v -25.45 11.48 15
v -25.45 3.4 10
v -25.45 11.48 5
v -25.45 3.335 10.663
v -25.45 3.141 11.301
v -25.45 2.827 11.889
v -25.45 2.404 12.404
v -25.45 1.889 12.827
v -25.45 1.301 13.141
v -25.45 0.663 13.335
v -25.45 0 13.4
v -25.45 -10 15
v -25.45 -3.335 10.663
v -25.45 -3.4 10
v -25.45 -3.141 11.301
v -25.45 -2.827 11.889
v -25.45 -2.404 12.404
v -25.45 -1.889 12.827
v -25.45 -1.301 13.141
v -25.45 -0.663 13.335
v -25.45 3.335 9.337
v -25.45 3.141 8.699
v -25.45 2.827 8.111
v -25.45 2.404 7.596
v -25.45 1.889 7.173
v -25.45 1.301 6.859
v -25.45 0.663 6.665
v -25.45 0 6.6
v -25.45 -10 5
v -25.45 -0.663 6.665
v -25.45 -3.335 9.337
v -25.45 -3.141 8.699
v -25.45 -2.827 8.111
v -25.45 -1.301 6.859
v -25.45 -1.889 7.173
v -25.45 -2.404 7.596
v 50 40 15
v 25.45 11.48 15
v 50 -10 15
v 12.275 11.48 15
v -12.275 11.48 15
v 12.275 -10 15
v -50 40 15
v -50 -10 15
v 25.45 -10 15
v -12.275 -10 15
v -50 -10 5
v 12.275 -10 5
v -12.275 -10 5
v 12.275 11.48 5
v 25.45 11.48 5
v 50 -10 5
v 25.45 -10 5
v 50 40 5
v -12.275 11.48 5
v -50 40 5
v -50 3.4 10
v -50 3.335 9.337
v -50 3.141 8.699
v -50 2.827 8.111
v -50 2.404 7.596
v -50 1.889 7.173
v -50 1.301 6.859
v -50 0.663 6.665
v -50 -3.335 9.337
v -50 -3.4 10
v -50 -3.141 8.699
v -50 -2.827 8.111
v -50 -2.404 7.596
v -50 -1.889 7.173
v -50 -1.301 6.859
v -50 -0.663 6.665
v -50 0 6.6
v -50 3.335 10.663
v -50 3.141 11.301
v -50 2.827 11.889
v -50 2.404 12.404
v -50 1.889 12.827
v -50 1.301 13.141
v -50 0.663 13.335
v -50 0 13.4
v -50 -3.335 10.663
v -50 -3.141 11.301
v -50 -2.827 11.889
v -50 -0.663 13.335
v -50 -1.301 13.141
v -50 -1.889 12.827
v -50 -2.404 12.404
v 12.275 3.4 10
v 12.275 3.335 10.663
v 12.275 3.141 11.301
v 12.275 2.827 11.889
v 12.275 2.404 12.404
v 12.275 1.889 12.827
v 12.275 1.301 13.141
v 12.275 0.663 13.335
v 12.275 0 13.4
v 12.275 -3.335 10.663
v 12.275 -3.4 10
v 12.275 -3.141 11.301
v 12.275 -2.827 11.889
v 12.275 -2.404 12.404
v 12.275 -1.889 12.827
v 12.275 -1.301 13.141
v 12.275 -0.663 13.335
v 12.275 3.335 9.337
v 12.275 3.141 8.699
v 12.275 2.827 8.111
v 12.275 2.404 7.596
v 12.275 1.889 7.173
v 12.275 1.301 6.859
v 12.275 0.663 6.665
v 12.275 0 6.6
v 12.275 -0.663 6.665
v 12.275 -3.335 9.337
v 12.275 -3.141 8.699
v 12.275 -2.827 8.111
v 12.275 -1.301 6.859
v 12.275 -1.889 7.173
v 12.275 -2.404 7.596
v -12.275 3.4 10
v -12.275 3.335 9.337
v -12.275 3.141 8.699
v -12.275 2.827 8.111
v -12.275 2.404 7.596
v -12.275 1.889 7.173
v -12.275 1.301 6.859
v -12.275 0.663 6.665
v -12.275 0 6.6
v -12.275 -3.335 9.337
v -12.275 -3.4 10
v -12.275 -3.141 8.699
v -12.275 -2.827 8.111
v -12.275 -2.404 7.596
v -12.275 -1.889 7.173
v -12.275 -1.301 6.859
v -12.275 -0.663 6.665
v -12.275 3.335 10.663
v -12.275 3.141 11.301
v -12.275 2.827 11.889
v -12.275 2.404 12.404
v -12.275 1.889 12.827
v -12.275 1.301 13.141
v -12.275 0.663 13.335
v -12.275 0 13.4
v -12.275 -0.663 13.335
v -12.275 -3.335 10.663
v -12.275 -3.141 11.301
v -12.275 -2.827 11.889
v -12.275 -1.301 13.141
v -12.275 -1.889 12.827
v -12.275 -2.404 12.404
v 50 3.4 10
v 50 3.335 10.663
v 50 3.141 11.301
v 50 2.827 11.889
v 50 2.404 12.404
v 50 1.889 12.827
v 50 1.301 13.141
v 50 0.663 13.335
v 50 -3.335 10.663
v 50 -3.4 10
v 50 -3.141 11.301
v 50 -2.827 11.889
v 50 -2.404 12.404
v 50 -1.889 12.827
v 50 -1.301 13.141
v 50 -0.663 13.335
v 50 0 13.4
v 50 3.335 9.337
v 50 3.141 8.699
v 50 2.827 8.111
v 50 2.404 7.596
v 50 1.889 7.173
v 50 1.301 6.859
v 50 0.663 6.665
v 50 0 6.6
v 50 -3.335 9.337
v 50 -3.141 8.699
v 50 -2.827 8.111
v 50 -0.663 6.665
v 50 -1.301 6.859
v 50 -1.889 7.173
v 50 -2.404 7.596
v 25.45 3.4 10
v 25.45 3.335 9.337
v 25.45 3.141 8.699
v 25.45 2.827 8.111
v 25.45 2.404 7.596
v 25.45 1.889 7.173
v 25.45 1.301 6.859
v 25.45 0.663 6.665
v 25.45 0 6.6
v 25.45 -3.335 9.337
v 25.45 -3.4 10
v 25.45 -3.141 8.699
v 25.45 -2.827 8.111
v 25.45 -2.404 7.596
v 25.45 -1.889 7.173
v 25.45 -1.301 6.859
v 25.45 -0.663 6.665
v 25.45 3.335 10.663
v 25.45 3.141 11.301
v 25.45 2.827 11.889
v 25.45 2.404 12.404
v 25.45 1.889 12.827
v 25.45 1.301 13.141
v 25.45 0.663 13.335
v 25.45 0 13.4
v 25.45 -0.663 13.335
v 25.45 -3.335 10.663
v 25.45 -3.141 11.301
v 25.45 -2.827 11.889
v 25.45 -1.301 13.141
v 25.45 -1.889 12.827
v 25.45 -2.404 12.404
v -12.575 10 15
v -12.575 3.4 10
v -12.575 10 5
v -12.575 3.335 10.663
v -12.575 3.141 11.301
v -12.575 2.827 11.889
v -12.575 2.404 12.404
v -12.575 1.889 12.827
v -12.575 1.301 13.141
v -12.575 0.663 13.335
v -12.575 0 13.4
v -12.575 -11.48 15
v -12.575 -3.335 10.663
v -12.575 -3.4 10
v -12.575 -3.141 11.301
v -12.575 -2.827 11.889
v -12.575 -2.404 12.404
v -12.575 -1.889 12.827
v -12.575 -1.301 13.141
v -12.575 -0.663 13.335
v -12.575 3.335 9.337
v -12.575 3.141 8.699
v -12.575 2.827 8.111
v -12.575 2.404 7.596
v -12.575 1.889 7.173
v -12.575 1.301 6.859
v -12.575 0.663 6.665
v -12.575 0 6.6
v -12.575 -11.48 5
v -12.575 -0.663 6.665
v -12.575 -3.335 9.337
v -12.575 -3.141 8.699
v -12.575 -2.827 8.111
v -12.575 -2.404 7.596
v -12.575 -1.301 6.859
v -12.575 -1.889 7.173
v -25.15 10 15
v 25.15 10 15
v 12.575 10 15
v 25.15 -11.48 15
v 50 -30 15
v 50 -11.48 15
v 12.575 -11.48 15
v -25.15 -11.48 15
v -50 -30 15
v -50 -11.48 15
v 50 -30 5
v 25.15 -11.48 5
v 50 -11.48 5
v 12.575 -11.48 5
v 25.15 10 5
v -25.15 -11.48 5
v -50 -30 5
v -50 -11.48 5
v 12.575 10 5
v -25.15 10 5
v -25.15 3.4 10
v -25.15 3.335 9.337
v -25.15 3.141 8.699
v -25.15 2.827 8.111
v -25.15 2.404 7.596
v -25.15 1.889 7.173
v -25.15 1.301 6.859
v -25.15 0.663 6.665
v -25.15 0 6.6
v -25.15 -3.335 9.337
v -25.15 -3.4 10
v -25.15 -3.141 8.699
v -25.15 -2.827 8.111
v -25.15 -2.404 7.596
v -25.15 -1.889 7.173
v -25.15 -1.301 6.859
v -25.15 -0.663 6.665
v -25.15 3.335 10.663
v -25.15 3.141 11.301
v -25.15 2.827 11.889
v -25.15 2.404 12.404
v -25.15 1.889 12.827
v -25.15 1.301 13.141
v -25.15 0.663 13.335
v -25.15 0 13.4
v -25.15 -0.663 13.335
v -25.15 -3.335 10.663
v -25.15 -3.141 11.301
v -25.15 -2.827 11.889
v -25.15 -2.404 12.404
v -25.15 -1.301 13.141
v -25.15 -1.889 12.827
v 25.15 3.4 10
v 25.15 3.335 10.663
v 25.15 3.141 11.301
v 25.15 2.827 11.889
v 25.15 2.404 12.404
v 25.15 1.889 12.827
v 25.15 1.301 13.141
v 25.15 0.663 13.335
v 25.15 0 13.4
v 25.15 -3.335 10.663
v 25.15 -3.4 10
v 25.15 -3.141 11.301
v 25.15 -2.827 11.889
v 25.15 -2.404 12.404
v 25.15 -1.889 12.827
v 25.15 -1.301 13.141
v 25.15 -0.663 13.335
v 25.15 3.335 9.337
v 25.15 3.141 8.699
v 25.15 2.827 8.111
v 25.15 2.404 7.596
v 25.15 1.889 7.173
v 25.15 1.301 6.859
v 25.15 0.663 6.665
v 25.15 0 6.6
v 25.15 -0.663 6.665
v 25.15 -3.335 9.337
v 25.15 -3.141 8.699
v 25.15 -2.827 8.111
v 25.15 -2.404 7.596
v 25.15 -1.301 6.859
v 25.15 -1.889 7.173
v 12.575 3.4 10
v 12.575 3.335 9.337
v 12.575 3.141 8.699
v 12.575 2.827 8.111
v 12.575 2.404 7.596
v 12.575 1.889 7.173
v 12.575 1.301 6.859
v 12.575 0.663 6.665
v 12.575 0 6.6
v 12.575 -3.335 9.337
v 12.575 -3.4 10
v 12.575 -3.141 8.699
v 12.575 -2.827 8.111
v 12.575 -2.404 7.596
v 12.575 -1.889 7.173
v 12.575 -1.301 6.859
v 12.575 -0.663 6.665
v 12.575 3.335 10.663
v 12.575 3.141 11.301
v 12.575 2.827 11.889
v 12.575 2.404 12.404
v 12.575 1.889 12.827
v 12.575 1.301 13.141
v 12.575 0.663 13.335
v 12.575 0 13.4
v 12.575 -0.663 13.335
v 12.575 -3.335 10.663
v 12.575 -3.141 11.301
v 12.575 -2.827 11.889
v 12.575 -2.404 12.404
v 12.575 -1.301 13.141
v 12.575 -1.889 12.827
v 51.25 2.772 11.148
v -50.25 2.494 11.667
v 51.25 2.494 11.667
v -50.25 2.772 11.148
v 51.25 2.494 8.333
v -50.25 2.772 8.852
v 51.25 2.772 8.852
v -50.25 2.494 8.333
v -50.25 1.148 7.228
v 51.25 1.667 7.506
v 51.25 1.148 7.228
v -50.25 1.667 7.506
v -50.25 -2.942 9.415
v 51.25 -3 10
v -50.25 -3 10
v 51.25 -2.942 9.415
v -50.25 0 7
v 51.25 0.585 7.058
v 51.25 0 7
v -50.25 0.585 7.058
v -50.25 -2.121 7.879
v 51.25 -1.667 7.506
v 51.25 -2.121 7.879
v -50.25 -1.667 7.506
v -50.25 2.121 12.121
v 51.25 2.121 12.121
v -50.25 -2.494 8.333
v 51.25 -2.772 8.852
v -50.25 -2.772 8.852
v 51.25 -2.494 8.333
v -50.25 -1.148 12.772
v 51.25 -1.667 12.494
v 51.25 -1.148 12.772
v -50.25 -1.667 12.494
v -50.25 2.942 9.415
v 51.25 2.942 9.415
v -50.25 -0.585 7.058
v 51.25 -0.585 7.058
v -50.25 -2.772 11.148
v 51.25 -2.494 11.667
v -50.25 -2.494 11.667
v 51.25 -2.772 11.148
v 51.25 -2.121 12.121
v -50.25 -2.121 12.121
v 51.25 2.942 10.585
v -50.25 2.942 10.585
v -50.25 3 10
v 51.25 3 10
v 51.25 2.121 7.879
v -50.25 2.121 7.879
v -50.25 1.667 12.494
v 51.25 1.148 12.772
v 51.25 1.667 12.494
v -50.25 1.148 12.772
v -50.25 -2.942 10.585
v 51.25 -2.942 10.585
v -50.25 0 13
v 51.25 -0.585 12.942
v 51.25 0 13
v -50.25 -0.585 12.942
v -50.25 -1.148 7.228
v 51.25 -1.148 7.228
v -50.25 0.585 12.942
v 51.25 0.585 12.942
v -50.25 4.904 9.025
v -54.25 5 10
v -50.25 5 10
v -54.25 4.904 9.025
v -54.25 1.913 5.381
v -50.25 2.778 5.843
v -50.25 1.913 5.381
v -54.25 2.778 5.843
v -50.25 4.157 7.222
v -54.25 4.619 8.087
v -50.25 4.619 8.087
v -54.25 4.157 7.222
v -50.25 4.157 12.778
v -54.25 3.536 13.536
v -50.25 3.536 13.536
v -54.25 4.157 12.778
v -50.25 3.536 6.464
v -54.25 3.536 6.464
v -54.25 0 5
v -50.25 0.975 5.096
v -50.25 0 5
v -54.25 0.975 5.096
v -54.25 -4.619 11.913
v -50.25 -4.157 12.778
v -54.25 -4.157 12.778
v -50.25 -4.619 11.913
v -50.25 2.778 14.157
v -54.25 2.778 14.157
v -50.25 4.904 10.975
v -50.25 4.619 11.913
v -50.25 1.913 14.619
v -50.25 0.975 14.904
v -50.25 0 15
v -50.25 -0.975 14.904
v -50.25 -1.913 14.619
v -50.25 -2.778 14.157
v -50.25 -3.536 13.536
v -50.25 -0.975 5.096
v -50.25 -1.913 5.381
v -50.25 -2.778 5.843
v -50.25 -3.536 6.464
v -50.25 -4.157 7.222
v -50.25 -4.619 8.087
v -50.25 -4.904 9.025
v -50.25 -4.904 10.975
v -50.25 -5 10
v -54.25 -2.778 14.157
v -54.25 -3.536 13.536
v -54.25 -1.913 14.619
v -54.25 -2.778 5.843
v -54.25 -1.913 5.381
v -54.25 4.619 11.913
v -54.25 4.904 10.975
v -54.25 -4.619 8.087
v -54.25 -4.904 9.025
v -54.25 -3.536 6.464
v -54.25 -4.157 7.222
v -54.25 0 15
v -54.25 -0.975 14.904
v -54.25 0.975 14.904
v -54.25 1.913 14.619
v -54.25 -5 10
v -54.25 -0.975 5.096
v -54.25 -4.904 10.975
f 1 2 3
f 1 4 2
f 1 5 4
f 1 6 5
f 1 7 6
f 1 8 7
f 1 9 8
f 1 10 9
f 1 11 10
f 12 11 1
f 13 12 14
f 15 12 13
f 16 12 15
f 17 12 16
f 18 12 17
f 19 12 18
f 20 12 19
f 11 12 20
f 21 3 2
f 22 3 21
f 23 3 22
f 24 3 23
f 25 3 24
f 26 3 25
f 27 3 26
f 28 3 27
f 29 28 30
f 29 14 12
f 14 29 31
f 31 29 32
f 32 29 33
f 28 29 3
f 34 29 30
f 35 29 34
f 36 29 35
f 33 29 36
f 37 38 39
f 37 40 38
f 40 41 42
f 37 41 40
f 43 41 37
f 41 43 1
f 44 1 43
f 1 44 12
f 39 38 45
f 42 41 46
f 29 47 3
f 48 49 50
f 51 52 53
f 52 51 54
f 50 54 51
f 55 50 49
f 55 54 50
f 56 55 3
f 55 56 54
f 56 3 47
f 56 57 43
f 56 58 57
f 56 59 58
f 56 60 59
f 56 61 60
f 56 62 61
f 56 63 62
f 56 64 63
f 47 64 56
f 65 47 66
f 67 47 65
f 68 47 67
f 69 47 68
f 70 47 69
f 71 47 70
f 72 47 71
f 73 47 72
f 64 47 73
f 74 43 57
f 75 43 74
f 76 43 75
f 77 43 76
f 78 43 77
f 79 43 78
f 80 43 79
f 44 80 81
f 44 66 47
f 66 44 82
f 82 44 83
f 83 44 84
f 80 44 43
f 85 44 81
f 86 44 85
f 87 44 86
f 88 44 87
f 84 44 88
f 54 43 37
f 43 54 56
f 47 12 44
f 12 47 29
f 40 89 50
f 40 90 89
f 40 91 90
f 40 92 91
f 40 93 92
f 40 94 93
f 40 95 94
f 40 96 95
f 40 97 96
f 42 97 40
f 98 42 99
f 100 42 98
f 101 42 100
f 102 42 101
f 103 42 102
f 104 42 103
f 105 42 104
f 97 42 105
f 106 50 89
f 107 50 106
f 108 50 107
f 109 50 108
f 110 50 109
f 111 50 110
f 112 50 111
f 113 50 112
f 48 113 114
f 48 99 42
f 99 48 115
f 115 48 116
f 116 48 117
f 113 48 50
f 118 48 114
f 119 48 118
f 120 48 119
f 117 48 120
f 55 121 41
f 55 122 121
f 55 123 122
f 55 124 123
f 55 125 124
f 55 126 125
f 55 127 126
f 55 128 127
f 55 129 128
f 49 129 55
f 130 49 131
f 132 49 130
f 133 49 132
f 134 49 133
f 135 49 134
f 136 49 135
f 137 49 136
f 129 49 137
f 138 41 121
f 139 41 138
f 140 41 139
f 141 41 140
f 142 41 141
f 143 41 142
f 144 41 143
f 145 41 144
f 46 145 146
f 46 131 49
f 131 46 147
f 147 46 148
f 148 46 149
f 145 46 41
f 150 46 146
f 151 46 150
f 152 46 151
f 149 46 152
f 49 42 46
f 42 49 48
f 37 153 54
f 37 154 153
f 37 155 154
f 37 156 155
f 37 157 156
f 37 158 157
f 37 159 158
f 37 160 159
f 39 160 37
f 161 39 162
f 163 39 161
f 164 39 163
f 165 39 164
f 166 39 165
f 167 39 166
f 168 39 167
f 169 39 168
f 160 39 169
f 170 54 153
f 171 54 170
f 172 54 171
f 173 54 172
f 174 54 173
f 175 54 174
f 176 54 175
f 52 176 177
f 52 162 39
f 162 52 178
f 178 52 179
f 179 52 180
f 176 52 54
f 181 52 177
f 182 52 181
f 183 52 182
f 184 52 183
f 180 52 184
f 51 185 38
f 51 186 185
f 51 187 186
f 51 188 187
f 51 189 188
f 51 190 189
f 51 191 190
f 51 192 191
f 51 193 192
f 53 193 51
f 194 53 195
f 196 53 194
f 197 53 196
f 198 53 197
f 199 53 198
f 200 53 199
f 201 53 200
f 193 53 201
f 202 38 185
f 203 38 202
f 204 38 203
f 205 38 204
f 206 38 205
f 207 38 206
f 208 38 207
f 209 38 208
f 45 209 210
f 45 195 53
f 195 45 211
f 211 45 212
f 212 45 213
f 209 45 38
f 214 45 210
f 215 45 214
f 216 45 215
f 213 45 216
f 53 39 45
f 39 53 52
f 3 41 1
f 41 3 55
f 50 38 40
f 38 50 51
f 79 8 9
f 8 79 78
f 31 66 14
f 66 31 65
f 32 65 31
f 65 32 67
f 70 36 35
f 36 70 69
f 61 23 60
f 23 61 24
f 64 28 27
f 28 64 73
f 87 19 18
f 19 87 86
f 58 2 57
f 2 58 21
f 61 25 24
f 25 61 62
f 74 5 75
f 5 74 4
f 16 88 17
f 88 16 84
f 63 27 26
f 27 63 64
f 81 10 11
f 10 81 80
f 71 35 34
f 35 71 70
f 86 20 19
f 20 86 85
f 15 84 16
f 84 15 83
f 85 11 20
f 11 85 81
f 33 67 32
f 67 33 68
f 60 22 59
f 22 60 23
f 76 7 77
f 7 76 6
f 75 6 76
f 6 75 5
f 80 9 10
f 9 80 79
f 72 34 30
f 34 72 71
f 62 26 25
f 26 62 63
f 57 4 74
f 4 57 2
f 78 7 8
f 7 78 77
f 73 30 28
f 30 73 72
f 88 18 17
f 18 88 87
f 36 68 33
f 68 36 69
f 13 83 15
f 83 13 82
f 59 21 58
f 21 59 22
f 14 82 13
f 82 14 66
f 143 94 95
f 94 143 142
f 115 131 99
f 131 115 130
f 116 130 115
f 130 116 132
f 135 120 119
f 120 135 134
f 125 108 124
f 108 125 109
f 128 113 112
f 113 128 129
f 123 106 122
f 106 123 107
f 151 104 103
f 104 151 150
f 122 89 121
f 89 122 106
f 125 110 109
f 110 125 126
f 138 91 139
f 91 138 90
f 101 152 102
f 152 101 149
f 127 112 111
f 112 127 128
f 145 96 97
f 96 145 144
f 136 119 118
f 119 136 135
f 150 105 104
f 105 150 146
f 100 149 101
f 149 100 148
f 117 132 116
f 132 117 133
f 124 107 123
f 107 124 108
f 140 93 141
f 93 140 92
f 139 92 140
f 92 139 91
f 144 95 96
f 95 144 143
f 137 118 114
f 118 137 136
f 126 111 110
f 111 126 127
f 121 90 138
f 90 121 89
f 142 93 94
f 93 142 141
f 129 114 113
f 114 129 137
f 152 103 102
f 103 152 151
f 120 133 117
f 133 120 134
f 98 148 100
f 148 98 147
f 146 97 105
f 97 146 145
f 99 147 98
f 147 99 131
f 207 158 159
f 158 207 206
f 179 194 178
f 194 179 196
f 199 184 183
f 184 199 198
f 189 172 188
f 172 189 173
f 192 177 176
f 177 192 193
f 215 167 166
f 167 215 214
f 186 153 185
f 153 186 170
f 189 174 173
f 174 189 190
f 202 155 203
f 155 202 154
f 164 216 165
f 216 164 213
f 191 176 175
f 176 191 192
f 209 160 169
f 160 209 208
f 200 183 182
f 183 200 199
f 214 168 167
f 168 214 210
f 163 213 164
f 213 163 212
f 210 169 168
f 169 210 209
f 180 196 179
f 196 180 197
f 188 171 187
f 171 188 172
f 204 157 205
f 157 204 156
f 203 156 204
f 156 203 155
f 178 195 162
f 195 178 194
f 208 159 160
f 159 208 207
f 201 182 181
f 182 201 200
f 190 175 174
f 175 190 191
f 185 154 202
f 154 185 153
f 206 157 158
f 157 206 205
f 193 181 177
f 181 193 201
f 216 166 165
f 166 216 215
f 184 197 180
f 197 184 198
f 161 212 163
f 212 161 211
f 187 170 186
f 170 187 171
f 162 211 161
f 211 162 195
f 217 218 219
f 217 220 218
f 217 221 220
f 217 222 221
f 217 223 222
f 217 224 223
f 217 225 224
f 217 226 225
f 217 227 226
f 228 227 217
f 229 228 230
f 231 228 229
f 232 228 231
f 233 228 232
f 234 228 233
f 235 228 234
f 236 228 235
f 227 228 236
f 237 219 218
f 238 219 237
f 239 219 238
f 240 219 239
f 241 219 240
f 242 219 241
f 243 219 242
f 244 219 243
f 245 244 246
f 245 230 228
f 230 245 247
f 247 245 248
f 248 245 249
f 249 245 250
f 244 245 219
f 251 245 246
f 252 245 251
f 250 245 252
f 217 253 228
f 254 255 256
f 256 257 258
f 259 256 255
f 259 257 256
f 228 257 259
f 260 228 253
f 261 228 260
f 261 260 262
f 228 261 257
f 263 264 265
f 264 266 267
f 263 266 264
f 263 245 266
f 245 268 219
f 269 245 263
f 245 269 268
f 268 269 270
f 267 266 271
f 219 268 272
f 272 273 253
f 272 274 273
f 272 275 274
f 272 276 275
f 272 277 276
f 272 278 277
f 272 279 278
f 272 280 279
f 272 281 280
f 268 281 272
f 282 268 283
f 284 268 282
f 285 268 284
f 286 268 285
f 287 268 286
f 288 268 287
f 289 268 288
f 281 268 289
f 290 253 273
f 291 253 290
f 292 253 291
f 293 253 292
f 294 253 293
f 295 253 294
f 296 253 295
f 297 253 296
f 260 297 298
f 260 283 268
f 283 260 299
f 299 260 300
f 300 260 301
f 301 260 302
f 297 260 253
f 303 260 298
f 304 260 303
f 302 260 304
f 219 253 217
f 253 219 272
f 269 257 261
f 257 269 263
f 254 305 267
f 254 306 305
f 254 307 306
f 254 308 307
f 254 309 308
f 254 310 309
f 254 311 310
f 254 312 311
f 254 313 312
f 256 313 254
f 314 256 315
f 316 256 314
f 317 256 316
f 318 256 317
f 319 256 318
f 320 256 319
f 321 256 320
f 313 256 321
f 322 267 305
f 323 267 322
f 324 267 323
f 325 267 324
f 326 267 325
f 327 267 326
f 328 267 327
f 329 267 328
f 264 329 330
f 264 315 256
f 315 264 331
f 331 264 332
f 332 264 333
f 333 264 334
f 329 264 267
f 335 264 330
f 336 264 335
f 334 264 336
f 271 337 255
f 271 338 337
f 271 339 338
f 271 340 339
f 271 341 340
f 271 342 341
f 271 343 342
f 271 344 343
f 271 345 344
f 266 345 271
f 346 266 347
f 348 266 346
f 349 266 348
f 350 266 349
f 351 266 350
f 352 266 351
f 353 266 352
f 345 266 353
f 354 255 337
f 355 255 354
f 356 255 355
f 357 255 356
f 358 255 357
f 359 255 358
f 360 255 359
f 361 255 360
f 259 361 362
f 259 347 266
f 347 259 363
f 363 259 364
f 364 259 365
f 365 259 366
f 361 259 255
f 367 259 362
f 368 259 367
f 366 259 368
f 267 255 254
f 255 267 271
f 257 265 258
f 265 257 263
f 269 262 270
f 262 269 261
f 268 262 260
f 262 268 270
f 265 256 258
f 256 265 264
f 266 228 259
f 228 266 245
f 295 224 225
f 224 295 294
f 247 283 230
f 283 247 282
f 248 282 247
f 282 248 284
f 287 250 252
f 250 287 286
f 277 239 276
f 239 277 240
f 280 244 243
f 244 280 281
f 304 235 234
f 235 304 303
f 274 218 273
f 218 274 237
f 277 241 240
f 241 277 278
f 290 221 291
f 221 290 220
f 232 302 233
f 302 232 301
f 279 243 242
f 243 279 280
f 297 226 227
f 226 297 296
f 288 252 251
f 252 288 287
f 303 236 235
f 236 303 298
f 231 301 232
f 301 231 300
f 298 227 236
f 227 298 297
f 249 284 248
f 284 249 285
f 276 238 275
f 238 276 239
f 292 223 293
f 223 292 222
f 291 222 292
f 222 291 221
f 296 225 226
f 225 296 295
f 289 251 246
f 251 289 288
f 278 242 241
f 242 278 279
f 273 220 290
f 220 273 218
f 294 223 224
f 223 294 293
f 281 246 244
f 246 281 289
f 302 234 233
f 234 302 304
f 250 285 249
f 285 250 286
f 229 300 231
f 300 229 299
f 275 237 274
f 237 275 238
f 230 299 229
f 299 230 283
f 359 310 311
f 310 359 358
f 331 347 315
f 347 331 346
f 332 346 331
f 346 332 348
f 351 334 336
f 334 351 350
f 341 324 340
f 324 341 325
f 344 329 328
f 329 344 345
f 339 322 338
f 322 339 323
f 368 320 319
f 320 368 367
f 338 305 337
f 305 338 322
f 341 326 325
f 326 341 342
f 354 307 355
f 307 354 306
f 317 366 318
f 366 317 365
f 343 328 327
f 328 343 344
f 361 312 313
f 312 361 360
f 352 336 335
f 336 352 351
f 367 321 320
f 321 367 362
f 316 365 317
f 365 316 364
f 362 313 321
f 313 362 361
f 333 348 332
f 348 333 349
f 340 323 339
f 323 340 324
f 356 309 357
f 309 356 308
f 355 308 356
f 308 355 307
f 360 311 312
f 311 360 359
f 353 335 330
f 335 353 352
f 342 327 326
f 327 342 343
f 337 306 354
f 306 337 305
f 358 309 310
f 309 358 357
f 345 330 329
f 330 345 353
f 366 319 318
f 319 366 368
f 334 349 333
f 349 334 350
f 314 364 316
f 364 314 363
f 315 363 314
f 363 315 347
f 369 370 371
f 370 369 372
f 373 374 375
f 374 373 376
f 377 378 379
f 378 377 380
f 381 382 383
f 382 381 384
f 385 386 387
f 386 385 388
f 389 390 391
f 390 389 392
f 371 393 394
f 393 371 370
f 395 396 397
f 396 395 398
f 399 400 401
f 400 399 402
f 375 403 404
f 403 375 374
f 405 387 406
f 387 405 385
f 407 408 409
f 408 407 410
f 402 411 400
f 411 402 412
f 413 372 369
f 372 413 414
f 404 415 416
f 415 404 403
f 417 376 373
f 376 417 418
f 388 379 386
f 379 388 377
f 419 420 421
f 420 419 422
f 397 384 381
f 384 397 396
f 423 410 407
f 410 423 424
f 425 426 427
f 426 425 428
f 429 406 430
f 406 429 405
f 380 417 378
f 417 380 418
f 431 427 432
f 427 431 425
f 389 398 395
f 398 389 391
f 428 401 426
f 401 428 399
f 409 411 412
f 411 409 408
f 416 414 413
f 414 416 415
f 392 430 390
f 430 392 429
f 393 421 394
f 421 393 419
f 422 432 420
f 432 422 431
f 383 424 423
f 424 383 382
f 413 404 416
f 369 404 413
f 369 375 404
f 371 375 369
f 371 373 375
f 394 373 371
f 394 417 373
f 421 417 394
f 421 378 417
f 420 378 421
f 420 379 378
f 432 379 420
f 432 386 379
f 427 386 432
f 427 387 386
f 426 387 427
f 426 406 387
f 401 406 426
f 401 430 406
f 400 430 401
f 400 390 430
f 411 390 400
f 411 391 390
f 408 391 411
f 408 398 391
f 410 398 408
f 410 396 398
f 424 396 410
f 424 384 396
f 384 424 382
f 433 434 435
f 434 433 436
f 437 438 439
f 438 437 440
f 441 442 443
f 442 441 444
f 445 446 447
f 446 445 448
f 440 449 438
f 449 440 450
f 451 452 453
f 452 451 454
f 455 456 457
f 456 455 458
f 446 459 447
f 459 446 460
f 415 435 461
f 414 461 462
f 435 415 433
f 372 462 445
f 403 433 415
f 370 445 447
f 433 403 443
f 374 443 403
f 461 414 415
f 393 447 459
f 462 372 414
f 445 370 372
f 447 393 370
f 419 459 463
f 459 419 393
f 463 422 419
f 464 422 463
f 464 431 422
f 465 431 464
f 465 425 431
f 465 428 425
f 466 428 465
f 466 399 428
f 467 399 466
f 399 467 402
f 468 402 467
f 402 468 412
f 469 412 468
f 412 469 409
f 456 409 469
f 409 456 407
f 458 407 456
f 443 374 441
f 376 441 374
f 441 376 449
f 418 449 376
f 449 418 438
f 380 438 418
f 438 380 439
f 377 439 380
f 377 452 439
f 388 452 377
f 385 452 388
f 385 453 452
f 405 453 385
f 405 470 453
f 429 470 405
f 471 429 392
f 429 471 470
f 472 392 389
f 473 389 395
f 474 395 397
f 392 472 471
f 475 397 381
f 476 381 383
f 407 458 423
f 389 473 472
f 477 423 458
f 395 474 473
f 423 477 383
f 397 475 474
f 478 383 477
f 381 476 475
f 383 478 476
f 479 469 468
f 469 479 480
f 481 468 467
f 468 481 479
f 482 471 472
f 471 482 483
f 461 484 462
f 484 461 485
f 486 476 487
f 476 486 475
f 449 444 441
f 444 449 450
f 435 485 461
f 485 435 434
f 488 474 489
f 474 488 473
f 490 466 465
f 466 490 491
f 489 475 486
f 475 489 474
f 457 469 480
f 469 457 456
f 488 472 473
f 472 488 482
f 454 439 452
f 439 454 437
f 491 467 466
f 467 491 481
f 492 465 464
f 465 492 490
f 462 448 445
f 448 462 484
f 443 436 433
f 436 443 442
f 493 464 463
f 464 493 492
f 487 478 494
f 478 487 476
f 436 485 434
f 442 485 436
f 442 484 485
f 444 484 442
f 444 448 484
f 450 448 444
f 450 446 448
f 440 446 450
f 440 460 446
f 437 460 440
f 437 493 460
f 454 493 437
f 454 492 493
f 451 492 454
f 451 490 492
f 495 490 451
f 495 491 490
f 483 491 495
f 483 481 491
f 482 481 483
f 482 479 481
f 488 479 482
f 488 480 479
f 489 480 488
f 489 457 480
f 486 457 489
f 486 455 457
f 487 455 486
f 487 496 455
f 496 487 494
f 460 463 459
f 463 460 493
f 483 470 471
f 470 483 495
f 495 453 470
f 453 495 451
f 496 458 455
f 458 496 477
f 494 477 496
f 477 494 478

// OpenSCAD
$fn = 32;

// ------------------------------------------------------------------------
// Butt hinge: hinge 100 mm, leaf swung 0 deg
// Every part is its own module, assembly() places every instance.
// ------------------------------------------------------------------------

// --- part 1 ---
module hinge_base() {
  difference() {
    union() {
      translate([-50, -10, -5]) cube([24.55, 50, 10]);
      translate([-12.275, -10, -5]) cube([24.55, 50, 10]);
      translate([25.45, -10, -5]) cube([24.55, 50, 10]);
      translate([-50, 11.48, -5]) cube([100, 28.52, 10]);
    }
    translate([-37.725, 0, 0]) rotate([0, 90, 0]) cylinder(h = 26.55, d = 6.8, center = true);
    translate([0, 0, 0]) rotate([0, 90, 0]) cylinder(h = 26.55, d = 6.8, center = true);
    translate([37.725, 0, 0]) rotate([0, 90, 0]) cylinder(h = 26.55, d = 6.8, center = true);
  }
}

// --- part 2 ---
module hinge_mover() {
  difference() {
    union() {
      translate([-25.15, -30, -5]) cube([12.575, 40, 10]);
      translate([12.575, -30, -5]) cube([12.575, 40, 10]);
      translate([-50, -30, -5]) cube([100, 18.52, 10]);
    }
    translate([-18.863, 0, 0]) rotate([0, 90, 0]) cylinder(h = 14.575, d = 6.8, center = true);
    translate([18.863, 0, 0]) rotate([0, 90, 0]) cylinder(h = 14.575, d = 6.8, center = true);
  }
}

// --- part 3 ---
module hinge_pin() {
  rotate([0, 90, 0]) cylinder(h = 102.5, d = 6, center = true);
  translate([-54.25, 0, 0]) rotate([0, 90, 0]) cylinder(h = 4, d = 10);
}

// --- assembly ---
module assembly() {
  color([0.80, 0.24, 0.20]) translate([0, 0, 10]) rotate([0, 0, 0]) hinge_base();
  color([0.20, 0.45, 0.75]) translate([0, 0, 10]) rotate([0, 0, 0]) hinge_mover();
  color([0.25, 0.62, 0.32]) translate([0, 0, 10]) rotate([0, 0, 0]) hinge_pin();
}

assembly();
